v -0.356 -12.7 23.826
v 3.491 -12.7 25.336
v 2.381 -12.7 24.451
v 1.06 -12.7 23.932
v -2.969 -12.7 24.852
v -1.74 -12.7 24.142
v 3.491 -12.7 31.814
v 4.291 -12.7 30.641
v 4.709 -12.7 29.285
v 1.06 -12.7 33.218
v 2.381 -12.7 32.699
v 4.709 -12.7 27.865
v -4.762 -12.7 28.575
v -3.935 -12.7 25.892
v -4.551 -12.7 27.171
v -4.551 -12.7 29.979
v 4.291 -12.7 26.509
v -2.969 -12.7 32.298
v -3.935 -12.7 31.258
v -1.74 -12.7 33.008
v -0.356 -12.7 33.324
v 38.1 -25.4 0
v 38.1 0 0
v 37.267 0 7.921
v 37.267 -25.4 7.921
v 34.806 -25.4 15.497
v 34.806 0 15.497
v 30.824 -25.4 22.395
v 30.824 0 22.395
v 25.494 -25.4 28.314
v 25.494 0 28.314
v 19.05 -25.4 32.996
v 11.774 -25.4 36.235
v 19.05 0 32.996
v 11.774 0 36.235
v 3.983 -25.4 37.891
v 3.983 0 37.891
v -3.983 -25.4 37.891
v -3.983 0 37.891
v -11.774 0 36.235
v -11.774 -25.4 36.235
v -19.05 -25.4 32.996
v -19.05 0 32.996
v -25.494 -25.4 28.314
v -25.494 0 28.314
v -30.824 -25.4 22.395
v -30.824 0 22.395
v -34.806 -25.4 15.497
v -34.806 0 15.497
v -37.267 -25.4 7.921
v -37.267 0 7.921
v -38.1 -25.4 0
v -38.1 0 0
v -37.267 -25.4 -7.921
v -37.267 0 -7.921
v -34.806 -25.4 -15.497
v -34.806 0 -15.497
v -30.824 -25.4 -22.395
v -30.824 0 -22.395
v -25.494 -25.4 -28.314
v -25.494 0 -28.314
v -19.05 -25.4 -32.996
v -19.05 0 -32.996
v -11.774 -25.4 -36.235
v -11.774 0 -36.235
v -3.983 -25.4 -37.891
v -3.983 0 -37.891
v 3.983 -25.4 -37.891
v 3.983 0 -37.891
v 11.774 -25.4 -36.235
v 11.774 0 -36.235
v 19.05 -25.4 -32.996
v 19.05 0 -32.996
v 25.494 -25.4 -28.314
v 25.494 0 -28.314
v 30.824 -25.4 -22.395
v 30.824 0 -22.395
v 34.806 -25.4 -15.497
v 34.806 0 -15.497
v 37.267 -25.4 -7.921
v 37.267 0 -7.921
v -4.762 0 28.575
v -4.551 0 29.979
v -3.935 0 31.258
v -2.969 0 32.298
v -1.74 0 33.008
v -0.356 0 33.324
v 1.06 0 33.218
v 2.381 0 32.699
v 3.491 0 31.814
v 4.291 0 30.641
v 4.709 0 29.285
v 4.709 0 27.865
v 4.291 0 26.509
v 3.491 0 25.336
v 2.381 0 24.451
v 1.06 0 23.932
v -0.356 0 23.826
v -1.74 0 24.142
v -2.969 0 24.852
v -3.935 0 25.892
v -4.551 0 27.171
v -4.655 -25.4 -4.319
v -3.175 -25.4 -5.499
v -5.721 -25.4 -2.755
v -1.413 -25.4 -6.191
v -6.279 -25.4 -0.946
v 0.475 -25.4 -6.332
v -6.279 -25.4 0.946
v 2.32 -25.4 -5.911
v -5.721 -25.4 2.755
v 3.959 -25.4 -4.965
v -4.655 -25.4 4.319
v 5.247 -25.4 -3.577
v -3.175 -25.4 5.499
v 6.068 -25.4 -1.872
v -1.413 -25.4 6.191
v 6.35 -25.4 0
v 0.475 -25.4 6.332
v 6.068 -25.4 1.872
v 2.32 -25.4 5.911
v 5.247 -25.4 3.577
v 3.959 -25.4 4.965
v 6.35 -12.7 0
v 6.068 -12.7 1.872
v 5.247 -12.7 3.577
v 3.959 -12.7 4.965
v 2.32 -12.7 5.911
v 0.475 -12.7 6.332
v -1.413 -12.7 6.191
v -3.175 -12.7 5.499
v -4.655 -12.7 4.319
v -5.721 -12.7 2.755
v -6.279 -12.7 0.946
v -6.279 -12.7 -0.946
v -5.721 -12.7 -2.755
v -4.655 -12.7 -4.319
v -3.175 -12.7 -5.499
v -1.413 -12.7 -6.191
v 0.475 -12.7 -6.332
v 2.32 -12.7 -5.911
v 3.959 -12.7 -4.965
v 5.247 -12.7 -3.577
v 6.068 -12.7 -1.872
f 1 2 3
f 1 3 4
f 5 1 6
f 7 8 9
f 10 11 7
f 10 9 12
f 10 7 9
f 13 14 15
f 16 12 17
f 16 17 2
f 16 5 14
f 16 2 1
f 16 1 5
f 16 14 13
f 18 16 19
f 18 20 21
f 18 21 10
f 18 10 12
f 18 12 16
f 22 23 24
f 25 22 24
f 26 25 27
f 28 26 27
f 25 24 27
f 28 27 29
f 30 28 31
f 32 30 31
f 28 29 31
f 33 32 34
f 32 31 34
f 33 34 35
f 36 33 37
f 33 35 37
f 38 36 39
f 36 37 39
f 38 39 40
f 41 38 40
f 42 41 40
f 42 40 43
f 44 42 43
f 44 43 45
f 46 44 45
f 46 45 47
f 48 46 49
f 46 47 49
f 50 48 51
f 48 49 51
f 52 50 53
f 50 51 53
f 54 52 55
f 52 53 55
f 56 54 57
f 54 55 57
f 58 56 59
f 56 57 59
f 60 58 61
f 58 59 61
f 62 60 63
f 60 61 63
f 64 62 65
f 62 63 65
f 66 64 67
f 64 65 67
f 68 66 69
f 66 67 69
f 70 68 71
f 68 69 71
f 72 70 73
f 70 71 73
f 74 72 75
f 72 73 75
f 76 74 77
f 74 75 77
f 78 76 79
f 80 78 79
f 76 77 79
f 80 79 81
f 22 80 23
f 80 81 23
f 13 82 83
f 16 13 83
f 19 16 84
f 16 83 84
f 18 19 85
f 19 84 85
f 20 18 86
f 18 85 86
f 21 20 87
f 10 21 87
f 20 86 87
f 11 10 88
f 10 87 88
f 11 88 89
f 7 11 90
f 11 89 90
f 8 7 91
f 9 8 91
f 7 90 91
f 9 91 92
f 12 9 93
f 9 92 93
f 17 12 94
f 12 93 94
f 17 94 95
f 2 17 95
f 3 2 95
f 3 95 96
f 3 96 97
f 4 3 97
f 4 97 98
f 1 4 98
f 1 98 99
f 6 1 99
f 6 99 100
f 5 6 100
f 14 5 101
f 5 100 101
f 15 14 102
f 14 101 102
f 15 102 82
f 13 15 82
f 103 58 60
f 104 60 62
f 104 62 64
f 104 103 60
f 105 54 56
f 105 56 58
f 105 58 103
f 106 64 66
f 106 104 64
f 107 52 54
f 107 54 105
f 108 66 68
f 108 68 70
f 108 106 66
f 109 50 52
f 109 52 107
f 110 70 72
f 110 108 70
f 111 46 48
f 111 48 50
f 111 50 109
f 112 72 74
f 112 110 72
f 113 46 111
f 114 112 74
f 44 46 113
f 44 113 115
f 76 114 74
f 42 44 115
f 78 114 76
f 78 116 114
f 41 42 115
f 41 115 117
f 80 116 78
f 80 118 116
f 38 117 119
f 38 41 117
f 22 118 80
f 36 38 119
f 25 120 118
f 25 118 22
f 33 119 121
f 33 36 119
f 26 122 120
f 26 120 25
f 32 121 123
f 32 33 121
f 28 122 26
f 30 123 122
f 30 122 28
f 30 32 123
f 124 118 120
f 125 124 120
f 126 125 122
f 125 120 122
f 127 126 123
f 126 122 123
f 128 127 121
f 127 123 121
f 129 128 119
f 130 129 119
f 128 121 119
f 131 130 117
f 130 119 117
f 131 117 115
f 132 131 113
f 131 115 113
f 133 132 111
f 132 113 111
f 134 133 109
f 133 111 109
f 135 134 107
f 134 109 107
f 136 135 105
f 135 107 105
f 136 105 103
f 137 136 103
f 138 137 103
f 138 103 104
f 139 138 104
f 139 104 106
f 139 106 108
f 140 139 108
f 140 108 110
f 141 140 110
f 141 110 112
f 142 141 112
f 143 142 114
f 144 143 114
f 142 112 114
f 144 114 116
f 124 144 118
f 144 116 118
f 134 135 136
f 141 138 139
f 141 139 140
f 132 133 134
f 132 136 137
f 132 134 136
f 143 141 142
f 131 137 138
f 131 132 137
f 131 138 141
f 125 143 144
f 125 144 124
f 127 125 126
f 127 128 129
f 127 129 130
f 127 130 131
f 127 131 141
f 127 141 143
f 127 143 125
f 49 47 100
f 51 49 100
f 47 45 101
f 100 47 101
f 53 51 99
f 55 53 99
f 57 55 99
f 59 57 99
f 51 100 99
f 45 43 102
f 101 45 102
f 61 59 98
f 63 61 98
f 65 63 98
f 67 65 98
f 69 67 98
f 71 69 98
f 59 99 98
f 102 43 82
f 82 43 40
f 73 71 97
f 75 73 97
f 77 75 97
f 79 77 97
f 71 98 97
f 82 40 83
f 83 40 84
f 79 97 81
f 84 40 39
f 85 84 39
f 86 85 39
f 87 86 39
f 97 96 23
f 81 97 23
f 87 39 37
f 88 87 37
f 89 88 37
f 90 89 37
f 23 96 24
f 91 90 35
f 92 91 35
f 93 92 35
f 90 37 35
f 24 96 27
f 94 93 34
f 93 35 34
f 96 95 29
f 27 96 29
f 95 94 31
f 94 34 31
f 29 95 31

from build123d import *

# Parameters (mm, degrees)
F0_R     = 38.1
F1_DEPTH = 25.4
F2_R     = 6.35
F3_DEPTH = 12.7
F4_R     = 4.7625
F5_DEPTH = 12.7


with BuildPart() as f1:
    # F0 (on Front) → F1 (new body)
    with BuildSketch(Plane.XZ):
        Circle(F0_R)
    extrude(amount=F1_DEPTH)

    # F2 (on face) → F3 (cut)
    with BuildSketch(Plane.XZ.offset(25.4)):
        Circle(F2_R)
    extrude(amount=-F3_DEPTH, mode=Mode.SUBTRACT)

    # F4 (on face) → F5 (cut)
    with BuildSketch(Plane(origin=(0, 0, 0), x_dir=(-1, 0, 0), z_dir=(0, 1, 0))):
        with Locations((0, 28.575)):
            Circle(F4_R)
    extrude(amount=-F5_DEPTH, mode=Mode.SUBTRACT)


solid = f1.part
